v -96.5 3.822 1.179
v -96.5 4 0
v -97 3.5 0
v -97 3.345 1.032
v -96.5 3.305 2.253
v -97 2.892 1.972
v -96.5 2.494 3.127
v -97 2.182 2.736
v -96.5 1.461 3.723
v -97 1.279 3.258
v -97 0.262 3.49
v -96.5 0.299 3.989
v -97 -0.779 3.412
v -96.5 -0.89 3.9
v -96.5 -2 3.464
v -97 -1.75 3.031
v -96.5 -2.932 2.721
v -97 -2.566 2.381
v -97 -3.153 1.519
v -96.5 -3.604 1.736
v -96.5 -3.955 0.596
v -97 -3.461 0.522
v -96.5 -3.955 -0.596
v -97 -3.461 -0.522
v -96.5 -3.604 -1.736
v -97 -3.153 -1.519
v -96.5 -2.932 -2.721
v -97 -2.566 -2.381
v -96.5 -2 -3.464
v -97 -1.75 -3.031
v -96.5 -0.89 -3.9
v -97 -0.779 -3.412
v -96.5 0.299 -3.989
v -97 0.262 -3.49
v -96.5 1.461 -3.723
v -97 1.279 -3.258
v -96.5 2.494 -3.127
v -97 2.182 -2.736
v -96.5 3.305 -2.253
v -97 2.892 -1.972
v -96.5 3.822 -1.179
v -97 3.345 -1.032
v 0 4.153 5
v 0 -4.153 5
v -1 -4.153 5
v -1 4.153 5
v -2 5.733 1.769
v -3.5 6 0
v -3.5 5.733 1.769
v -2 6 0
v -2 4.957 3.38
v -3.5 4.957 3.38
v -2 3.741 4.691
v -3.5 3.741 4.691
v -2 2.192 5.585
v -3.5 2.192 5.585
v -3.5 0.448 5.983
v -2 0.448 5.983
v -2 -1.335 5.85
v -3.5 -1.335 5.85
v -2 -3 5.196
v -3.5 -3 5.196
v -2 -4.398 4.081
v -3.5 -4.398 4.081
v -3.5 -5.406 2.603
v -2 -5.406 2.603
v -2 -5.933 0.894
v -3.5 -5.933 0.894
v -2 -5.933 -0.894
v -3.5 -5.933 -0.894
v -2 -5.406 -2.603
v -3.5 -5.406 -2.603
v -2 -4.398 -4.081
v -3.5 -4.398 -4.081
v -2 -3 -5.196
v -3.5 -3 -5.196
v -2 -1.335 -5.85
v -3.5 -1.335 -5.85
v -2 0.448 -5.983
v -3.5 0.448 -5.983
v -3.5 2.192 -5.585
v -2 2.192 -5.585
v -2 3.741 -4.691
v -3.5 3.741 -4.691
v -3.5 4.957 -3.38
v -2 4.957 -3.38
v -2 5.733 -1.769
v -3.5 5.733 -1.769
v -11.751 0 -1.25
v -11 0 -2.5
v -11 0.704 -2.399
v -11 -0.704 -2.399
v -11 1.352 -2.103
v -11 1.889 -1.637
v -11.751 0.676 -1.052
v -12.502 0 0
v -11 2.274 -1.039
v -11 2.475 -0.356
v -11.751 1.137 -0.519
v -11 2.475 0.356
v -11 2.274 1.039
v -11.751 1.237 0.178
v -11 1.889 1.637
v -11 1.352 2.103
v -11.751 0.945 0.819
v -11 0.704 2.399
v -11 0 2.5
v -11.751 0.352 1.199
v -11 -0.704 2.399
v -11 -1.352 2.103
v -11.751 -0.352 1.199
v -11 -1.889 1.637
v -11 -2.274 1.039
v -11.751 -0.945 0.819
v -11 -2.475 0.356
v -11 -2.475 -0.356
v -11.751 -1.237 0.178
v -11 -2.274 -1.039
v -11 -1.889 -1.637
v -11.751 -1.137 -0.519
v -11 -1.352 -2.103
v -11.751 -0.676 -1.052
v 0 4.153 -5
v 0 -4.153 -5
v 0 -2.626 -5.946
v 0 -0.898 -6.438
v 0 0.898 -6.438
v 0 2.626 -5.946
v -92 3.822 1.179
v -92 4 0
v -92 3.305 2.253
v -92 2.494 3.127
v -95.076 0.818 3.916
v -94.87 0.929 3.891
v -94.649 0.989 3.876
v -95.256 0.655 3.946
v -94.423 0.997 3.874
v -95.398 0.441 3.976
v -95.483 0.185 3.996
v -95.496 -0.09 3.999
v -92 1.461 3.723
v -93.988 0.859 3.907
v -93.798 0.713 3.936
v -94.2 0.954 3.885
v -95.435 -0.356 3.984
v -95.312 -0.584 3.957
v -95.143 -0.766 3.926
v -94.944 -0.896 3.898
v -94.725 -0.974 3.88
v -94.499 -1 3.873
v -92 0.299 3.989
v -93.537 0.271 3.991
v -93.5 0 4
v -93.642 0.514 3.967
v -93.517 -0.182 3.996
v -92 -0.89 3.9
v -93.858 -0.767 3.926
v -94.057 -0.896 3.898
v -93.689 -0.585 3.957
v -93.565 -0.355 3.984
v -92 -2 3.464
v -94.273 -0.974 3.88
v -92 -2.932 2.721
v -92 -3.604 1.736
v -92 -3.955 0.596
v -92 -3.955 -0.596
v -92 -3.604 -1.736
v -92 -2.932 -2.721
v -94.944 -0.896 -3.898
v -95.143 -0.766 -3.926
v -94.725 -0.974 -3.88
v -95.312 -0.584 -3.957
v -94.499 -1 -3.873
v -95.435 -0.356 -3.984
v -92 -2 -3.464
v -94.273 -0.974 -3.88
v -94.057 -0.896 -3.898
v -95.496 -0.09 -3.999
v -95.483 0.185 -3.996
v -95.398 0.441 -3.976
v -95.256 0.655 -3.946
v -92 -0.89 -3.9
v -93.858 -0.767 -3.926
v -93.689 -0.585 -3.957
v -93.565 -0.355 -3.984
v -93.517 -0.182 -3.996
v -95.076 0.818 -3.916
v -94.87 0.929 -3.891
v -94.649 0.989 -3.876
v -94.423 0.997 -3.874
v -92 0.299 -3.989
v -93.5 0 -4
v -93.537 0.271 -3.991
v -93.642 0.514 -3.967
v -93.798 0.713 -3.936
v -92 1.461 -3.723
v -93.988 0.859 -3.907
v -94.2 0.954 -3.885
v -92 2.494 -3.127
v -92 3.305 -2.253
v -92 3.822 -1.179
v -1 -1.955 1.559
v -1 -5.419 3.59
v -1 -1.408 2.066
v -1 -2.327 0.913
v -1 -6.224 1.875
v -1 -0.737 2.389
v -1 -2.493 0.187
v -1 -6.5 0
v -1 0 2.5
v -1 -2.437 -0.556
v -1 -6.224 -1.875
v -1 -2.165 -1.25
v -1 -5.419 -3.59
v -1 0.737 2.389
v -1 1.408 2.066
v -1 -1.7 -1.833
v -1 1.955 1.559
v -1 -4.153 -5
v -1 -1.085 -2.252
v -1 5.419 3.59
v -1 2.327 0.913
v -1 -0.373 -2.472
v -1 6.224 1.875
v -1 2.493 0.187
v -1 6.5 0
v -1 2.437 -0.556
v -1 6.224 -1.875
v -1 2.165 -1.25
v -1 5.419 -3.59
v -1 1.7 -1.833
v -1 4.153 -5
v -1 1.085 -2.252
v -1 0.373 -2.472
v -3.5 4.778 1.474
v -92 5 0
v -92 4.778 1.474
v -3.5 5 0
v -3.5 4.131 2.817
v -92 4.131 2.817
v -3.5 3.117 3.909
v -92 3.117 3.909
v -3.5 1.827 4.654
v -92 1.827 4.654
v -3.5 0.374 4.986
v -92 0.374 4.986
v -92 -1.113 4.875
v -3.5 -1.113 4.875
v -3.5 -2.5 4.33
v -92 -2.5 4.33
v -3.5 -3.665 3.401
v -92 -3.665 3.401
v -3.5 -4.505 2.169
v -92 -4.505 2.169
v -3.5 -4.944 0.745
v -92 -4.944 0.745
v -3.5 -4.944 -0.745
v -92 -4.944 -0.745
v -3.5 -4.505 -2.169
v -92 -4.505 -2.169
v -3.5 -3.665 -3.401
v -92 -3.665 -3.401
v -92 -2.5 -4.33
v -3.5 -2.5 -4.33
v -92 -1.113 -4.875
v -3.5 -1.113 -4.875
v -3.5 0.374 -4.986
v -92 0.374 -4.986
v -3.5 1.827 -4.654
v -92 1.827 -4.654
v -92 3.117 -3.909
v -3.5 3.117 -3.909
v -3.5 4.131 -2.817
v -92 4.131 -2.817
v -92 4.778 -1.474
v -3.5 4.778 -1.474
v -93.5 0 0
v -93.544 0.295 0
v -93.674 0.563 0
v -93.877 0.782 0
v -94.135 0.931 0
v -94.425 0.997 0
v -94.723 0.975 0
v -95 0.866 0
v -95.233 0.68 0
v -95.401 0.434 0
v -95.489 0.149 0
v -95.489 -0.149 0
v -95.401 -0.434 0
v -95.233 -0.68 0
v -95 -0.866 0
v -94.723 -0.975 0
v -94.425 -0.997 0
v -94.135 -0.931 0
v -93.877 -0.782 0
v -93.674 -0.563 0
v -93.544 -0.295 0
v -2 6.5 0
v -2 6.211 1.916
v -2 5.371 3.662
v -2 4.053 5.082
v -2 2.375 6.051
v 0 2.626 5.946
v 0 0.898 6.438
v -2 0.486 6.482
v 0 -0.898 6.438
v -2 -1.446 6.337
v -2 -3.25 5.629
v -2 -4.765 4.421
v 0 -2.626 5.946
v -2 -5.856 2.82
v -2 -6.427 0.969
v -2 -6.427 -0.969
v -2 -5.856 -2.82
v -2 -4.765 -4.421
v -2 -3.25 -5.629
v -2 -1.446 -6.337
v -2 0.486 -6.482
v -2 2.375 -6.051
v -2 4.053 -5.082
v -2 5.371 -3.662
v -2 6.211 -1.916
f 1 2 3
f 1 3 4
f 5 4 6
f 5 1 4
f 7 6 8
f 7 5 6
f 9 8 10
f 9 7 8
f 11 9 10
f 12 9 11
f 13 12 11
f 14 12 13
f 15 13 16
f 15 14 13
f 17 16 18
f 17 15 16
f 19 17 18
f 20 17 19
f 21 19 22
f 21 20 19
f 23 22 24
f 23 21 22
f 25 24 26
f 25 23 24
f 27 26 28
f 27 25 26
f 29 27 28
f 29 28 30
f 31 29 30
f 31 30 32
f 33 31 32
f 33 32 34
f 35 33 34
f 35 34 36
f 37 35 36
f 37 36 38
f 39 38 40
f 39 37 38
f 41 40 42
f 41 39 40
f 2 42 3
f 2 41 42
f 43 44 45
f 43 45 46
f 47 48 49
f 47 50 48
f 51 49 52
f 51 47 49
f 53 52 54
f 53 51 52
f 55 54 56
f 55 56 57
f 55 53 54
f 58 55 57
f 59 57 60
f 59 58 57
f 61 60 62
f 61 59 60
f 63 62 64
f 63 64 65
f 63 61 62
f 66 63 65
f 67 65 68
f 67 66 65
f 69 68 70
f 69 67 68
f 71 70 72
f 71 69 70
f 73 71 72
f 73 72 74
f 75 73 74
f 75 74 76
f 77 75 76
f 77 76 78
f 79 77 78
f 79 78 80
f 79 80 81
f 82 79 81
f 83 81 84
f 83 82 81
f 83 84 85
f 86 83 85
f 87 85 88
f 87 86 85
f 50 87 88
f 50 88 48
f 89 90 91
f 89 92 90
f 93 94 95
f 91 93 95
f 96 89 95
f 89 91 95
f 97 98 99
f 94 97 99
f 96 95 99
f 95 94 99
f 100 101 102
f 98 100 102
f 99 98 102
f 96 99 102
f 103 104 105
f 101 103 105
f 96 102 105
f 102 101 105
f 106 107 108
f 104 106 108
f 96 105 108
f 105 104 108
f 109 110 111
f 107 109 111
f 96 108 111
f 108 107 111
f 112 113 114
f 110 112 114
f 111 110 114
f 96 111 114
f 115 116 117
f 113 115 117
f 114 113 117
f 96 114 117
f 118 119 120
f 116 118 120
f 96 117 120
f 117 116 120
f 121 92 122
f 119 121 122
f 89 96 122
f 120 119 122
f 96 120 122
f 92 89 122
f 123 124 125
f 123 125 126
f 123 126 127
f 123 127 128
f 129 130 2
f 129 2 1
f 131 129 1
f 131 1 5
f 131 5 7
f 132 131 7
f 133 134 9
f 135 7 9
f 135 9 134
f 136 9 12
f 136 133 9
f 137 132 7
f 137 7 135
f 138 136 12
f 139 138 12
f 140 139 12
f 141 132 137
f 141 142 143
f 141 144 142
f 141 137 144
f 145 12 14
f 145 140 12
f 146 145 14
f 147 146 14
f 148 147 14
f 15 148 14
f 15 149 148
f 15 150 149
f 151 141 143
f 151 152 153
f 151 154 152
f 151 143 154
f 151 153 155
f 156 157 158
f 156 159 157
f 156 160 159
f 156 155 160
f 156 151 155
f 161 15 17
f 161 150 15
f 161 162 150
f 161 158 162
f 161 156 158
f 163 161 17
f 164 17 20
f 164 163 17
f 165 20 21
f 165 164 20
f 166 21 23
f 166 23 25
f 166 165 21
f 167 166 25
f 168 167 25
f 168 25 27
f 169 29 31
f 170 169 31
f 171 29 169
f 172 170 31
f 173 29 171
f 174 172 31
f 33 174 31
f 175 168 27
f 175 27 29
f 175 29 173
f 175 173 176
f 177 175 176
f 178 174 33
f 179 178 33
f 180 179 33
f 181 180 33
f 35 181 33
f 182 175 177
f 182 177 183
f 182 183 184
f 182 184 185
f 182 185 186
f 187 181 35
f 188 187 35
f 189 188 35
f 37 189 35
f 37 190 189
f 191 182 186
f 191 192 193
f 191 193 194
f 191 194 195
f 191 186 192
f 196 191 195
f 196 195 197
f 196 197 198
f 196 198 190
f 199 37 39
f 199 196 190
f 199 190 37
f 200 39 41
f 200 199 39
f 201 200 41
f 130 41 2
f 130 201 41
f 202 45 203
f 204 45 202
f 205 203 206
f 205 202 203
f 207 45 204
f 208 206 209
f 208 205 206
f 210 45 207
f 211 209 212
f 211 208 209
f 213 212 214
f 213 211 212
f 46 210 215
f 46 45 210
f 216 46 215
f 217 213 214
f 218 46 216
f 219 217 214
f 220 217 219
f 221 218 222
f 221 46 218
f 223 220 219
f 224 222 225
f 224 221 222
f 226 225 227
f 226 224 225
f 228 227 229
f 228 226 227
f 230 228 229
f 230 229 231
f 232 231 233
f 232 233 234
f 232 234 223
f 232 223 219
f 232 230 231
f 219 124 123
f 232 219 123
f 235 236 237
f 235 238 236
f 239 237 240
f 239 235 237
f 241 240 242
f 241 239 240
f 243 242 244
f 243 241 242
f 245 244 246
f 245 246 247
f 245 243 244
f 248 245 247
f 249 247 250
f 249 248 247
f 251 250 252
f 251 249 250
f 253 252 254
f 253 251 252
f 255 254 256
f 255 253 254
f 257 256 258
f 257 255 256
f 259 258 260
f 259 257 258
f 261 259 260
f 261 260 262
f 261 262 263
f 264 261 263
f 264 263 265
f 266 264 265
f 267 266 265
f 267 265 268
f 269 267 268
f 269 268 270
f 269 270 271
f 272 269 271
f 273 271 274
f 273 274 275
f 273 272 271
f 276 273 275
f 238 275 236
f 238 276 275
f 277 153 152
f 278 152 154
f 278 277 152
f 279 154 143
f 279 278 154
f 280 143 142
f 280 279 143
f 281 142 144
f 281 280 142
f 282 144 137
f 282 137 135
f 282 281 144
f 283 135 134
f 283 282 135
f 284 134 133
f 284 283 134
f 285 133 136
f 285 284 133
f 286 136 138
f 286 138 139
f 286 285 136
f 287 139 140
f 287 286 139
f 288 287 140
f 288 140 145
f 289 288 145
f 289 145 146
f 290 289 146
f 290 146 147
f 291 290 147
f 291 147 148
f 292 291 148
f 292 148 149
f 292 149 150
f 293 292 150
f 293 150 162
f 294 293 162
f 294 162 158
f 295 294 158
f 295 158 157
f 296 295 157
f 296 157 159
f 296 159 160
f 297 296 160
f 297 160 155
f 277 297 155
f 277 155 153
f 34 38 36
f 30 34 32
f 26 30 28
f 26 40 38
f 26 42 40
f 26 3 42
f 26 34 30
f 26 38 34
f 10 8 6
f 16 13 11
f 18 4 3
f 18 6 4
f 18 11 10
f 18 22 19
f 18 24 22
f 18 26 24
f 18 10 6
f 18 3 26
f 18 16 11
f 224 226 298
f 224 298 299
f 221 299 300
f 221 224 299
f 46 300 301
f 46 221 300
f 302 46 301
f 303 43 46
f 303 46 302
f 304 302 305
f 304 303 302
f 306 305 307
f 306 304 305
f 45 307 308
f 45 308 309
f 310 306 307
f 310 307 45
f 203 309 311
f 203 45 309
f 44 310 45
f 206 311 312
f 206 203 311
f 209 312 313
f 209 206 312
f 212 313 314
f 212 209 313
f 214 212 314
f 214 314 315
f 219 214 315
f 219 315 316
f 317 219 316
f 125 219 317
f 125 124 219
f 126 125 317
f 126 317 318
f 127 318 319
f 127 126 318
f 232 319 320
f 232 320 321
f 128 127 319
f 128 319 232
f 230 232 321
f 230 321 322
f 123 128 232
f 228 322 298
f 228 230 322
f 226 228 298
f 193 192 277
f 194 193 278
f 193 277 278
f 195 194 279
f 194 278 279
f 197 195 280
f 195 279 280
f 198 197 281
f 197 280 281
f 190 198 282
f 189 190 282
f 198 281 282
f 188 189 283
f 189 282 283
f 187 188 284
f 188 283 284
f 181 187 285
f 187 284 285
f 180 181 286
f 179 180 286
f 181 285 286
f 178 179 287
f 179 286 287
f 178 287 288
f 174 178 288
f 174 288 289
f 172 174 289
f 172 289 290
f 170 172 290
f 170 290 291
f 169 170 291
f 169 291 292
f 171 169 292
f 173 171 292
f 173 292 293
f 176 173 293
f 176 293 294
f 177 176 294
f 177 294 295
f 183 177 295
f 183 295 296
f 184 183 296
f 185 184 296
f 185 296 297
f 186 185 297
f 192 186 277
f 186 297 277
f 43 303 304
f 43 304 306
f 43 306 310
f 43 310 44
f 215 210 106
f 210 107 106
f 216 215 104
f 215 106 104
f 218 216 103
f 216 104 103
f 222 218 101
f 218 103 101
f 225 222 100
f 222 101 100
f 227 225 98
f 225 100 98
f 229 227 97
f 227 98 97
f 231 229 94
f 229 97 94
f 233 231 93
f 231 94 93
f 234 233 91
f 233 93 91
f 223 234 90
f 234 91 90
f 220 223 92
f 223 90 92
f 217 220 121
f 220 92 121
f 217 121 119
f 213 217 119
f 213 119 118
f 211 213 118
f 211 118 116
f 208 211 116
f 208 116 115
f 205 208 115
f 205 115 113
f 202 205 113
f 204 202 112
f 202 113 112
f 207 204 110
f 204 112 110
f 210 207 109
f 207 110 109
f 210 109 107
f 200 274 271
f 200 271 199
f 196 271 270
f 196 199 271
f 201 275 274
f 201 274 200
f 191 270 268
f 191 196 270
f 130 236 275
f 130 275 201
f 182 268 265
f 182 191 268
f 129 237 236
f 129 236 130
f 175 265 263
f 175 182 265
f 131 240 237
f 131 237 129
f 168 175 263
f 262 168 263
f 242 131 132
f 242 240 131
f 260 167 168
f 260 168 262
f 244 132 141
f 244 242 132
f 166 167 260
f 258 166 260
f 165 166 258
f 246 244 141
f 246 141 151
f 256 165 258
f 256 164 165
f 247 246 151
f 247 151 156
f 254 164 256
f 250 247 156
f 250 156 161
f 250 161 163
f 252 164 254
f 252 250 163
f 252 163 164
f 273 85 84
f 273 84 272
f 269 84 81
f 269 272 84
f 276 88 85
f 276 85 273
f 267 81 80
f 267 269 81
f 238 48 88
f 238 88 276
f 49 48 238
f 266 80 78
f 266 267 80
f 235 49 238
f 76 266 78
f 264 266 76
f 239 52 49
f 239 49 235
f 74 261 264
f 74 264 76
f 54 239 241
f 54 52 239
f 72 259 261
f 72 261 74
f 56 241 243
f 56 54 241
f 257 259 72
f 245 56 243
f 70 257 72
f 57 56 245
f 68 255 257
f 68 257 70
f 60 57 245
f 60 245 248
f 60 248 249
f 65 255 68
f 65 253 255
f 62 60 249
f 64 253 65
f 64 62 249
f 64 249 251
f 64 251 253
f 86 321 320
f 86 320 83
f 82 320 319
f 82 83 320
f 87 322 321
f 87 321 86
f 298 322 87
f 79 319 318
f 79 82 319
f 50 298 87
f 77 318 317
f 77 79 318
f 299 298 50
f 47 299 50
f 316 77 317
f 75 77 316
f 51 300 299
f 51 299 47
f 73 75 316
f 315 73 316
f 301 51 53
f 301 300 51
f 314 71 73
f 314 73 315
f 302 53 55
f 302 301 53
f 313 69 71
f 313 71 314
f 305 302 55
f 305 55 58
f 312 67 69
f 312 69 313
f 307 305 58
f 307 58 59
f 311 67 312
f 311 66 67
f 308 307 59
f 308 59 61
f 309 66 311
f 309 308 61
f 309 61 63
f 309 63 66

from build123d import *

# Parameters (mm, degrees)
SKETCH4_W               = 10
SKETCH4_H               = 13
CUT_EXTRUDE2_DEPTH      = 1
M6_TAPPED_HOLE1_D       = 5
M6_TAPPED_HOLE1_DEPTH   = 10
M6_TAPPED_HOLE1_TIP     = 1.502151548
SKETCH8_R               = 1
CUT_EXTRUDE3_DEPTH      = 7.5
CUT_EXTRUDE3_DEPTH_BACK = 7.5
CHAMFER1_SIZE           = 0.5


with BuildPart() as part:
    # Sketch1 → Revolve1 (revolve)
    with BuildSketch(Plane.XY):
        Polygon((-97, 0), (-97, 4), (-92, 4), (-92, 5), (-3.5, 5), (-3.5, 6), (-2, 6), (-2, 6.5), (0, 6.5), (0, 0), align=None)
    revolve(axis=Axis((0, 0, 0), (1, 0, 0)))

    # Sketch4 → Cut-Extrude2 (cut)
    with BuildSketch(Plane(origin=(0, 0, 0), x_dir=(0, 0, -1), z_dir=(1, 0, 0))):
        Rectangle(SKETCH4_W, SKETCH4_H)
    extrude(amount=-CUT_EXTRUDE2_DEPTH, mode=Mode.SUBTRACT)

    # M6 Tapped Hole1
    with Locations(Plane(origin=(-1, 0, 0), x_dir=(0, 0, -1), z_dir=(1, 0, 0))):
        with Locations((0, 0)):
            Hole(M6_TAPPED_HOLE1_D / 2, depth=M6_TAPPED_HOLE1_DEPTH)
            with Locations((0, 0, -(M6_TAPPED_HOLE1_DEPTH + M6_TAPPED_HOLE1_TIP / 2))):  # 118° drill point
                Cone(0, M6_TAPPED_HOLE1_D / 2, M6_TAPPED_HOLE1_TIP, mode=Mode.SUBTRACT)

    # Sketch8 → Cut-Extrude3 (cut, two sides)
    with BuildSketch(Plane.XY) as cut_extrude3_sk:
        with Locations((-94.5, 0)):
            Circle(SKETCH8_R)
    extrude(amount=CUT_EXTRUDE3_DEPTH, mode=Mode.SUBTRACT)
    extrude(cut_extrude3_sk.sketch, amount=-CUT_EXTRUDE3_DEPTH_BACK, mode=Mode.SUBTRACT)

    # Chamfer1
    chamfer1_edges = [part.edges().sort_by_distance(p)[0] for p in [
        (-97, -4, 0),
    ]]
    chamfer(chamfer1_edges, length=CHAMFER1_SIZE)


solid = part.part
